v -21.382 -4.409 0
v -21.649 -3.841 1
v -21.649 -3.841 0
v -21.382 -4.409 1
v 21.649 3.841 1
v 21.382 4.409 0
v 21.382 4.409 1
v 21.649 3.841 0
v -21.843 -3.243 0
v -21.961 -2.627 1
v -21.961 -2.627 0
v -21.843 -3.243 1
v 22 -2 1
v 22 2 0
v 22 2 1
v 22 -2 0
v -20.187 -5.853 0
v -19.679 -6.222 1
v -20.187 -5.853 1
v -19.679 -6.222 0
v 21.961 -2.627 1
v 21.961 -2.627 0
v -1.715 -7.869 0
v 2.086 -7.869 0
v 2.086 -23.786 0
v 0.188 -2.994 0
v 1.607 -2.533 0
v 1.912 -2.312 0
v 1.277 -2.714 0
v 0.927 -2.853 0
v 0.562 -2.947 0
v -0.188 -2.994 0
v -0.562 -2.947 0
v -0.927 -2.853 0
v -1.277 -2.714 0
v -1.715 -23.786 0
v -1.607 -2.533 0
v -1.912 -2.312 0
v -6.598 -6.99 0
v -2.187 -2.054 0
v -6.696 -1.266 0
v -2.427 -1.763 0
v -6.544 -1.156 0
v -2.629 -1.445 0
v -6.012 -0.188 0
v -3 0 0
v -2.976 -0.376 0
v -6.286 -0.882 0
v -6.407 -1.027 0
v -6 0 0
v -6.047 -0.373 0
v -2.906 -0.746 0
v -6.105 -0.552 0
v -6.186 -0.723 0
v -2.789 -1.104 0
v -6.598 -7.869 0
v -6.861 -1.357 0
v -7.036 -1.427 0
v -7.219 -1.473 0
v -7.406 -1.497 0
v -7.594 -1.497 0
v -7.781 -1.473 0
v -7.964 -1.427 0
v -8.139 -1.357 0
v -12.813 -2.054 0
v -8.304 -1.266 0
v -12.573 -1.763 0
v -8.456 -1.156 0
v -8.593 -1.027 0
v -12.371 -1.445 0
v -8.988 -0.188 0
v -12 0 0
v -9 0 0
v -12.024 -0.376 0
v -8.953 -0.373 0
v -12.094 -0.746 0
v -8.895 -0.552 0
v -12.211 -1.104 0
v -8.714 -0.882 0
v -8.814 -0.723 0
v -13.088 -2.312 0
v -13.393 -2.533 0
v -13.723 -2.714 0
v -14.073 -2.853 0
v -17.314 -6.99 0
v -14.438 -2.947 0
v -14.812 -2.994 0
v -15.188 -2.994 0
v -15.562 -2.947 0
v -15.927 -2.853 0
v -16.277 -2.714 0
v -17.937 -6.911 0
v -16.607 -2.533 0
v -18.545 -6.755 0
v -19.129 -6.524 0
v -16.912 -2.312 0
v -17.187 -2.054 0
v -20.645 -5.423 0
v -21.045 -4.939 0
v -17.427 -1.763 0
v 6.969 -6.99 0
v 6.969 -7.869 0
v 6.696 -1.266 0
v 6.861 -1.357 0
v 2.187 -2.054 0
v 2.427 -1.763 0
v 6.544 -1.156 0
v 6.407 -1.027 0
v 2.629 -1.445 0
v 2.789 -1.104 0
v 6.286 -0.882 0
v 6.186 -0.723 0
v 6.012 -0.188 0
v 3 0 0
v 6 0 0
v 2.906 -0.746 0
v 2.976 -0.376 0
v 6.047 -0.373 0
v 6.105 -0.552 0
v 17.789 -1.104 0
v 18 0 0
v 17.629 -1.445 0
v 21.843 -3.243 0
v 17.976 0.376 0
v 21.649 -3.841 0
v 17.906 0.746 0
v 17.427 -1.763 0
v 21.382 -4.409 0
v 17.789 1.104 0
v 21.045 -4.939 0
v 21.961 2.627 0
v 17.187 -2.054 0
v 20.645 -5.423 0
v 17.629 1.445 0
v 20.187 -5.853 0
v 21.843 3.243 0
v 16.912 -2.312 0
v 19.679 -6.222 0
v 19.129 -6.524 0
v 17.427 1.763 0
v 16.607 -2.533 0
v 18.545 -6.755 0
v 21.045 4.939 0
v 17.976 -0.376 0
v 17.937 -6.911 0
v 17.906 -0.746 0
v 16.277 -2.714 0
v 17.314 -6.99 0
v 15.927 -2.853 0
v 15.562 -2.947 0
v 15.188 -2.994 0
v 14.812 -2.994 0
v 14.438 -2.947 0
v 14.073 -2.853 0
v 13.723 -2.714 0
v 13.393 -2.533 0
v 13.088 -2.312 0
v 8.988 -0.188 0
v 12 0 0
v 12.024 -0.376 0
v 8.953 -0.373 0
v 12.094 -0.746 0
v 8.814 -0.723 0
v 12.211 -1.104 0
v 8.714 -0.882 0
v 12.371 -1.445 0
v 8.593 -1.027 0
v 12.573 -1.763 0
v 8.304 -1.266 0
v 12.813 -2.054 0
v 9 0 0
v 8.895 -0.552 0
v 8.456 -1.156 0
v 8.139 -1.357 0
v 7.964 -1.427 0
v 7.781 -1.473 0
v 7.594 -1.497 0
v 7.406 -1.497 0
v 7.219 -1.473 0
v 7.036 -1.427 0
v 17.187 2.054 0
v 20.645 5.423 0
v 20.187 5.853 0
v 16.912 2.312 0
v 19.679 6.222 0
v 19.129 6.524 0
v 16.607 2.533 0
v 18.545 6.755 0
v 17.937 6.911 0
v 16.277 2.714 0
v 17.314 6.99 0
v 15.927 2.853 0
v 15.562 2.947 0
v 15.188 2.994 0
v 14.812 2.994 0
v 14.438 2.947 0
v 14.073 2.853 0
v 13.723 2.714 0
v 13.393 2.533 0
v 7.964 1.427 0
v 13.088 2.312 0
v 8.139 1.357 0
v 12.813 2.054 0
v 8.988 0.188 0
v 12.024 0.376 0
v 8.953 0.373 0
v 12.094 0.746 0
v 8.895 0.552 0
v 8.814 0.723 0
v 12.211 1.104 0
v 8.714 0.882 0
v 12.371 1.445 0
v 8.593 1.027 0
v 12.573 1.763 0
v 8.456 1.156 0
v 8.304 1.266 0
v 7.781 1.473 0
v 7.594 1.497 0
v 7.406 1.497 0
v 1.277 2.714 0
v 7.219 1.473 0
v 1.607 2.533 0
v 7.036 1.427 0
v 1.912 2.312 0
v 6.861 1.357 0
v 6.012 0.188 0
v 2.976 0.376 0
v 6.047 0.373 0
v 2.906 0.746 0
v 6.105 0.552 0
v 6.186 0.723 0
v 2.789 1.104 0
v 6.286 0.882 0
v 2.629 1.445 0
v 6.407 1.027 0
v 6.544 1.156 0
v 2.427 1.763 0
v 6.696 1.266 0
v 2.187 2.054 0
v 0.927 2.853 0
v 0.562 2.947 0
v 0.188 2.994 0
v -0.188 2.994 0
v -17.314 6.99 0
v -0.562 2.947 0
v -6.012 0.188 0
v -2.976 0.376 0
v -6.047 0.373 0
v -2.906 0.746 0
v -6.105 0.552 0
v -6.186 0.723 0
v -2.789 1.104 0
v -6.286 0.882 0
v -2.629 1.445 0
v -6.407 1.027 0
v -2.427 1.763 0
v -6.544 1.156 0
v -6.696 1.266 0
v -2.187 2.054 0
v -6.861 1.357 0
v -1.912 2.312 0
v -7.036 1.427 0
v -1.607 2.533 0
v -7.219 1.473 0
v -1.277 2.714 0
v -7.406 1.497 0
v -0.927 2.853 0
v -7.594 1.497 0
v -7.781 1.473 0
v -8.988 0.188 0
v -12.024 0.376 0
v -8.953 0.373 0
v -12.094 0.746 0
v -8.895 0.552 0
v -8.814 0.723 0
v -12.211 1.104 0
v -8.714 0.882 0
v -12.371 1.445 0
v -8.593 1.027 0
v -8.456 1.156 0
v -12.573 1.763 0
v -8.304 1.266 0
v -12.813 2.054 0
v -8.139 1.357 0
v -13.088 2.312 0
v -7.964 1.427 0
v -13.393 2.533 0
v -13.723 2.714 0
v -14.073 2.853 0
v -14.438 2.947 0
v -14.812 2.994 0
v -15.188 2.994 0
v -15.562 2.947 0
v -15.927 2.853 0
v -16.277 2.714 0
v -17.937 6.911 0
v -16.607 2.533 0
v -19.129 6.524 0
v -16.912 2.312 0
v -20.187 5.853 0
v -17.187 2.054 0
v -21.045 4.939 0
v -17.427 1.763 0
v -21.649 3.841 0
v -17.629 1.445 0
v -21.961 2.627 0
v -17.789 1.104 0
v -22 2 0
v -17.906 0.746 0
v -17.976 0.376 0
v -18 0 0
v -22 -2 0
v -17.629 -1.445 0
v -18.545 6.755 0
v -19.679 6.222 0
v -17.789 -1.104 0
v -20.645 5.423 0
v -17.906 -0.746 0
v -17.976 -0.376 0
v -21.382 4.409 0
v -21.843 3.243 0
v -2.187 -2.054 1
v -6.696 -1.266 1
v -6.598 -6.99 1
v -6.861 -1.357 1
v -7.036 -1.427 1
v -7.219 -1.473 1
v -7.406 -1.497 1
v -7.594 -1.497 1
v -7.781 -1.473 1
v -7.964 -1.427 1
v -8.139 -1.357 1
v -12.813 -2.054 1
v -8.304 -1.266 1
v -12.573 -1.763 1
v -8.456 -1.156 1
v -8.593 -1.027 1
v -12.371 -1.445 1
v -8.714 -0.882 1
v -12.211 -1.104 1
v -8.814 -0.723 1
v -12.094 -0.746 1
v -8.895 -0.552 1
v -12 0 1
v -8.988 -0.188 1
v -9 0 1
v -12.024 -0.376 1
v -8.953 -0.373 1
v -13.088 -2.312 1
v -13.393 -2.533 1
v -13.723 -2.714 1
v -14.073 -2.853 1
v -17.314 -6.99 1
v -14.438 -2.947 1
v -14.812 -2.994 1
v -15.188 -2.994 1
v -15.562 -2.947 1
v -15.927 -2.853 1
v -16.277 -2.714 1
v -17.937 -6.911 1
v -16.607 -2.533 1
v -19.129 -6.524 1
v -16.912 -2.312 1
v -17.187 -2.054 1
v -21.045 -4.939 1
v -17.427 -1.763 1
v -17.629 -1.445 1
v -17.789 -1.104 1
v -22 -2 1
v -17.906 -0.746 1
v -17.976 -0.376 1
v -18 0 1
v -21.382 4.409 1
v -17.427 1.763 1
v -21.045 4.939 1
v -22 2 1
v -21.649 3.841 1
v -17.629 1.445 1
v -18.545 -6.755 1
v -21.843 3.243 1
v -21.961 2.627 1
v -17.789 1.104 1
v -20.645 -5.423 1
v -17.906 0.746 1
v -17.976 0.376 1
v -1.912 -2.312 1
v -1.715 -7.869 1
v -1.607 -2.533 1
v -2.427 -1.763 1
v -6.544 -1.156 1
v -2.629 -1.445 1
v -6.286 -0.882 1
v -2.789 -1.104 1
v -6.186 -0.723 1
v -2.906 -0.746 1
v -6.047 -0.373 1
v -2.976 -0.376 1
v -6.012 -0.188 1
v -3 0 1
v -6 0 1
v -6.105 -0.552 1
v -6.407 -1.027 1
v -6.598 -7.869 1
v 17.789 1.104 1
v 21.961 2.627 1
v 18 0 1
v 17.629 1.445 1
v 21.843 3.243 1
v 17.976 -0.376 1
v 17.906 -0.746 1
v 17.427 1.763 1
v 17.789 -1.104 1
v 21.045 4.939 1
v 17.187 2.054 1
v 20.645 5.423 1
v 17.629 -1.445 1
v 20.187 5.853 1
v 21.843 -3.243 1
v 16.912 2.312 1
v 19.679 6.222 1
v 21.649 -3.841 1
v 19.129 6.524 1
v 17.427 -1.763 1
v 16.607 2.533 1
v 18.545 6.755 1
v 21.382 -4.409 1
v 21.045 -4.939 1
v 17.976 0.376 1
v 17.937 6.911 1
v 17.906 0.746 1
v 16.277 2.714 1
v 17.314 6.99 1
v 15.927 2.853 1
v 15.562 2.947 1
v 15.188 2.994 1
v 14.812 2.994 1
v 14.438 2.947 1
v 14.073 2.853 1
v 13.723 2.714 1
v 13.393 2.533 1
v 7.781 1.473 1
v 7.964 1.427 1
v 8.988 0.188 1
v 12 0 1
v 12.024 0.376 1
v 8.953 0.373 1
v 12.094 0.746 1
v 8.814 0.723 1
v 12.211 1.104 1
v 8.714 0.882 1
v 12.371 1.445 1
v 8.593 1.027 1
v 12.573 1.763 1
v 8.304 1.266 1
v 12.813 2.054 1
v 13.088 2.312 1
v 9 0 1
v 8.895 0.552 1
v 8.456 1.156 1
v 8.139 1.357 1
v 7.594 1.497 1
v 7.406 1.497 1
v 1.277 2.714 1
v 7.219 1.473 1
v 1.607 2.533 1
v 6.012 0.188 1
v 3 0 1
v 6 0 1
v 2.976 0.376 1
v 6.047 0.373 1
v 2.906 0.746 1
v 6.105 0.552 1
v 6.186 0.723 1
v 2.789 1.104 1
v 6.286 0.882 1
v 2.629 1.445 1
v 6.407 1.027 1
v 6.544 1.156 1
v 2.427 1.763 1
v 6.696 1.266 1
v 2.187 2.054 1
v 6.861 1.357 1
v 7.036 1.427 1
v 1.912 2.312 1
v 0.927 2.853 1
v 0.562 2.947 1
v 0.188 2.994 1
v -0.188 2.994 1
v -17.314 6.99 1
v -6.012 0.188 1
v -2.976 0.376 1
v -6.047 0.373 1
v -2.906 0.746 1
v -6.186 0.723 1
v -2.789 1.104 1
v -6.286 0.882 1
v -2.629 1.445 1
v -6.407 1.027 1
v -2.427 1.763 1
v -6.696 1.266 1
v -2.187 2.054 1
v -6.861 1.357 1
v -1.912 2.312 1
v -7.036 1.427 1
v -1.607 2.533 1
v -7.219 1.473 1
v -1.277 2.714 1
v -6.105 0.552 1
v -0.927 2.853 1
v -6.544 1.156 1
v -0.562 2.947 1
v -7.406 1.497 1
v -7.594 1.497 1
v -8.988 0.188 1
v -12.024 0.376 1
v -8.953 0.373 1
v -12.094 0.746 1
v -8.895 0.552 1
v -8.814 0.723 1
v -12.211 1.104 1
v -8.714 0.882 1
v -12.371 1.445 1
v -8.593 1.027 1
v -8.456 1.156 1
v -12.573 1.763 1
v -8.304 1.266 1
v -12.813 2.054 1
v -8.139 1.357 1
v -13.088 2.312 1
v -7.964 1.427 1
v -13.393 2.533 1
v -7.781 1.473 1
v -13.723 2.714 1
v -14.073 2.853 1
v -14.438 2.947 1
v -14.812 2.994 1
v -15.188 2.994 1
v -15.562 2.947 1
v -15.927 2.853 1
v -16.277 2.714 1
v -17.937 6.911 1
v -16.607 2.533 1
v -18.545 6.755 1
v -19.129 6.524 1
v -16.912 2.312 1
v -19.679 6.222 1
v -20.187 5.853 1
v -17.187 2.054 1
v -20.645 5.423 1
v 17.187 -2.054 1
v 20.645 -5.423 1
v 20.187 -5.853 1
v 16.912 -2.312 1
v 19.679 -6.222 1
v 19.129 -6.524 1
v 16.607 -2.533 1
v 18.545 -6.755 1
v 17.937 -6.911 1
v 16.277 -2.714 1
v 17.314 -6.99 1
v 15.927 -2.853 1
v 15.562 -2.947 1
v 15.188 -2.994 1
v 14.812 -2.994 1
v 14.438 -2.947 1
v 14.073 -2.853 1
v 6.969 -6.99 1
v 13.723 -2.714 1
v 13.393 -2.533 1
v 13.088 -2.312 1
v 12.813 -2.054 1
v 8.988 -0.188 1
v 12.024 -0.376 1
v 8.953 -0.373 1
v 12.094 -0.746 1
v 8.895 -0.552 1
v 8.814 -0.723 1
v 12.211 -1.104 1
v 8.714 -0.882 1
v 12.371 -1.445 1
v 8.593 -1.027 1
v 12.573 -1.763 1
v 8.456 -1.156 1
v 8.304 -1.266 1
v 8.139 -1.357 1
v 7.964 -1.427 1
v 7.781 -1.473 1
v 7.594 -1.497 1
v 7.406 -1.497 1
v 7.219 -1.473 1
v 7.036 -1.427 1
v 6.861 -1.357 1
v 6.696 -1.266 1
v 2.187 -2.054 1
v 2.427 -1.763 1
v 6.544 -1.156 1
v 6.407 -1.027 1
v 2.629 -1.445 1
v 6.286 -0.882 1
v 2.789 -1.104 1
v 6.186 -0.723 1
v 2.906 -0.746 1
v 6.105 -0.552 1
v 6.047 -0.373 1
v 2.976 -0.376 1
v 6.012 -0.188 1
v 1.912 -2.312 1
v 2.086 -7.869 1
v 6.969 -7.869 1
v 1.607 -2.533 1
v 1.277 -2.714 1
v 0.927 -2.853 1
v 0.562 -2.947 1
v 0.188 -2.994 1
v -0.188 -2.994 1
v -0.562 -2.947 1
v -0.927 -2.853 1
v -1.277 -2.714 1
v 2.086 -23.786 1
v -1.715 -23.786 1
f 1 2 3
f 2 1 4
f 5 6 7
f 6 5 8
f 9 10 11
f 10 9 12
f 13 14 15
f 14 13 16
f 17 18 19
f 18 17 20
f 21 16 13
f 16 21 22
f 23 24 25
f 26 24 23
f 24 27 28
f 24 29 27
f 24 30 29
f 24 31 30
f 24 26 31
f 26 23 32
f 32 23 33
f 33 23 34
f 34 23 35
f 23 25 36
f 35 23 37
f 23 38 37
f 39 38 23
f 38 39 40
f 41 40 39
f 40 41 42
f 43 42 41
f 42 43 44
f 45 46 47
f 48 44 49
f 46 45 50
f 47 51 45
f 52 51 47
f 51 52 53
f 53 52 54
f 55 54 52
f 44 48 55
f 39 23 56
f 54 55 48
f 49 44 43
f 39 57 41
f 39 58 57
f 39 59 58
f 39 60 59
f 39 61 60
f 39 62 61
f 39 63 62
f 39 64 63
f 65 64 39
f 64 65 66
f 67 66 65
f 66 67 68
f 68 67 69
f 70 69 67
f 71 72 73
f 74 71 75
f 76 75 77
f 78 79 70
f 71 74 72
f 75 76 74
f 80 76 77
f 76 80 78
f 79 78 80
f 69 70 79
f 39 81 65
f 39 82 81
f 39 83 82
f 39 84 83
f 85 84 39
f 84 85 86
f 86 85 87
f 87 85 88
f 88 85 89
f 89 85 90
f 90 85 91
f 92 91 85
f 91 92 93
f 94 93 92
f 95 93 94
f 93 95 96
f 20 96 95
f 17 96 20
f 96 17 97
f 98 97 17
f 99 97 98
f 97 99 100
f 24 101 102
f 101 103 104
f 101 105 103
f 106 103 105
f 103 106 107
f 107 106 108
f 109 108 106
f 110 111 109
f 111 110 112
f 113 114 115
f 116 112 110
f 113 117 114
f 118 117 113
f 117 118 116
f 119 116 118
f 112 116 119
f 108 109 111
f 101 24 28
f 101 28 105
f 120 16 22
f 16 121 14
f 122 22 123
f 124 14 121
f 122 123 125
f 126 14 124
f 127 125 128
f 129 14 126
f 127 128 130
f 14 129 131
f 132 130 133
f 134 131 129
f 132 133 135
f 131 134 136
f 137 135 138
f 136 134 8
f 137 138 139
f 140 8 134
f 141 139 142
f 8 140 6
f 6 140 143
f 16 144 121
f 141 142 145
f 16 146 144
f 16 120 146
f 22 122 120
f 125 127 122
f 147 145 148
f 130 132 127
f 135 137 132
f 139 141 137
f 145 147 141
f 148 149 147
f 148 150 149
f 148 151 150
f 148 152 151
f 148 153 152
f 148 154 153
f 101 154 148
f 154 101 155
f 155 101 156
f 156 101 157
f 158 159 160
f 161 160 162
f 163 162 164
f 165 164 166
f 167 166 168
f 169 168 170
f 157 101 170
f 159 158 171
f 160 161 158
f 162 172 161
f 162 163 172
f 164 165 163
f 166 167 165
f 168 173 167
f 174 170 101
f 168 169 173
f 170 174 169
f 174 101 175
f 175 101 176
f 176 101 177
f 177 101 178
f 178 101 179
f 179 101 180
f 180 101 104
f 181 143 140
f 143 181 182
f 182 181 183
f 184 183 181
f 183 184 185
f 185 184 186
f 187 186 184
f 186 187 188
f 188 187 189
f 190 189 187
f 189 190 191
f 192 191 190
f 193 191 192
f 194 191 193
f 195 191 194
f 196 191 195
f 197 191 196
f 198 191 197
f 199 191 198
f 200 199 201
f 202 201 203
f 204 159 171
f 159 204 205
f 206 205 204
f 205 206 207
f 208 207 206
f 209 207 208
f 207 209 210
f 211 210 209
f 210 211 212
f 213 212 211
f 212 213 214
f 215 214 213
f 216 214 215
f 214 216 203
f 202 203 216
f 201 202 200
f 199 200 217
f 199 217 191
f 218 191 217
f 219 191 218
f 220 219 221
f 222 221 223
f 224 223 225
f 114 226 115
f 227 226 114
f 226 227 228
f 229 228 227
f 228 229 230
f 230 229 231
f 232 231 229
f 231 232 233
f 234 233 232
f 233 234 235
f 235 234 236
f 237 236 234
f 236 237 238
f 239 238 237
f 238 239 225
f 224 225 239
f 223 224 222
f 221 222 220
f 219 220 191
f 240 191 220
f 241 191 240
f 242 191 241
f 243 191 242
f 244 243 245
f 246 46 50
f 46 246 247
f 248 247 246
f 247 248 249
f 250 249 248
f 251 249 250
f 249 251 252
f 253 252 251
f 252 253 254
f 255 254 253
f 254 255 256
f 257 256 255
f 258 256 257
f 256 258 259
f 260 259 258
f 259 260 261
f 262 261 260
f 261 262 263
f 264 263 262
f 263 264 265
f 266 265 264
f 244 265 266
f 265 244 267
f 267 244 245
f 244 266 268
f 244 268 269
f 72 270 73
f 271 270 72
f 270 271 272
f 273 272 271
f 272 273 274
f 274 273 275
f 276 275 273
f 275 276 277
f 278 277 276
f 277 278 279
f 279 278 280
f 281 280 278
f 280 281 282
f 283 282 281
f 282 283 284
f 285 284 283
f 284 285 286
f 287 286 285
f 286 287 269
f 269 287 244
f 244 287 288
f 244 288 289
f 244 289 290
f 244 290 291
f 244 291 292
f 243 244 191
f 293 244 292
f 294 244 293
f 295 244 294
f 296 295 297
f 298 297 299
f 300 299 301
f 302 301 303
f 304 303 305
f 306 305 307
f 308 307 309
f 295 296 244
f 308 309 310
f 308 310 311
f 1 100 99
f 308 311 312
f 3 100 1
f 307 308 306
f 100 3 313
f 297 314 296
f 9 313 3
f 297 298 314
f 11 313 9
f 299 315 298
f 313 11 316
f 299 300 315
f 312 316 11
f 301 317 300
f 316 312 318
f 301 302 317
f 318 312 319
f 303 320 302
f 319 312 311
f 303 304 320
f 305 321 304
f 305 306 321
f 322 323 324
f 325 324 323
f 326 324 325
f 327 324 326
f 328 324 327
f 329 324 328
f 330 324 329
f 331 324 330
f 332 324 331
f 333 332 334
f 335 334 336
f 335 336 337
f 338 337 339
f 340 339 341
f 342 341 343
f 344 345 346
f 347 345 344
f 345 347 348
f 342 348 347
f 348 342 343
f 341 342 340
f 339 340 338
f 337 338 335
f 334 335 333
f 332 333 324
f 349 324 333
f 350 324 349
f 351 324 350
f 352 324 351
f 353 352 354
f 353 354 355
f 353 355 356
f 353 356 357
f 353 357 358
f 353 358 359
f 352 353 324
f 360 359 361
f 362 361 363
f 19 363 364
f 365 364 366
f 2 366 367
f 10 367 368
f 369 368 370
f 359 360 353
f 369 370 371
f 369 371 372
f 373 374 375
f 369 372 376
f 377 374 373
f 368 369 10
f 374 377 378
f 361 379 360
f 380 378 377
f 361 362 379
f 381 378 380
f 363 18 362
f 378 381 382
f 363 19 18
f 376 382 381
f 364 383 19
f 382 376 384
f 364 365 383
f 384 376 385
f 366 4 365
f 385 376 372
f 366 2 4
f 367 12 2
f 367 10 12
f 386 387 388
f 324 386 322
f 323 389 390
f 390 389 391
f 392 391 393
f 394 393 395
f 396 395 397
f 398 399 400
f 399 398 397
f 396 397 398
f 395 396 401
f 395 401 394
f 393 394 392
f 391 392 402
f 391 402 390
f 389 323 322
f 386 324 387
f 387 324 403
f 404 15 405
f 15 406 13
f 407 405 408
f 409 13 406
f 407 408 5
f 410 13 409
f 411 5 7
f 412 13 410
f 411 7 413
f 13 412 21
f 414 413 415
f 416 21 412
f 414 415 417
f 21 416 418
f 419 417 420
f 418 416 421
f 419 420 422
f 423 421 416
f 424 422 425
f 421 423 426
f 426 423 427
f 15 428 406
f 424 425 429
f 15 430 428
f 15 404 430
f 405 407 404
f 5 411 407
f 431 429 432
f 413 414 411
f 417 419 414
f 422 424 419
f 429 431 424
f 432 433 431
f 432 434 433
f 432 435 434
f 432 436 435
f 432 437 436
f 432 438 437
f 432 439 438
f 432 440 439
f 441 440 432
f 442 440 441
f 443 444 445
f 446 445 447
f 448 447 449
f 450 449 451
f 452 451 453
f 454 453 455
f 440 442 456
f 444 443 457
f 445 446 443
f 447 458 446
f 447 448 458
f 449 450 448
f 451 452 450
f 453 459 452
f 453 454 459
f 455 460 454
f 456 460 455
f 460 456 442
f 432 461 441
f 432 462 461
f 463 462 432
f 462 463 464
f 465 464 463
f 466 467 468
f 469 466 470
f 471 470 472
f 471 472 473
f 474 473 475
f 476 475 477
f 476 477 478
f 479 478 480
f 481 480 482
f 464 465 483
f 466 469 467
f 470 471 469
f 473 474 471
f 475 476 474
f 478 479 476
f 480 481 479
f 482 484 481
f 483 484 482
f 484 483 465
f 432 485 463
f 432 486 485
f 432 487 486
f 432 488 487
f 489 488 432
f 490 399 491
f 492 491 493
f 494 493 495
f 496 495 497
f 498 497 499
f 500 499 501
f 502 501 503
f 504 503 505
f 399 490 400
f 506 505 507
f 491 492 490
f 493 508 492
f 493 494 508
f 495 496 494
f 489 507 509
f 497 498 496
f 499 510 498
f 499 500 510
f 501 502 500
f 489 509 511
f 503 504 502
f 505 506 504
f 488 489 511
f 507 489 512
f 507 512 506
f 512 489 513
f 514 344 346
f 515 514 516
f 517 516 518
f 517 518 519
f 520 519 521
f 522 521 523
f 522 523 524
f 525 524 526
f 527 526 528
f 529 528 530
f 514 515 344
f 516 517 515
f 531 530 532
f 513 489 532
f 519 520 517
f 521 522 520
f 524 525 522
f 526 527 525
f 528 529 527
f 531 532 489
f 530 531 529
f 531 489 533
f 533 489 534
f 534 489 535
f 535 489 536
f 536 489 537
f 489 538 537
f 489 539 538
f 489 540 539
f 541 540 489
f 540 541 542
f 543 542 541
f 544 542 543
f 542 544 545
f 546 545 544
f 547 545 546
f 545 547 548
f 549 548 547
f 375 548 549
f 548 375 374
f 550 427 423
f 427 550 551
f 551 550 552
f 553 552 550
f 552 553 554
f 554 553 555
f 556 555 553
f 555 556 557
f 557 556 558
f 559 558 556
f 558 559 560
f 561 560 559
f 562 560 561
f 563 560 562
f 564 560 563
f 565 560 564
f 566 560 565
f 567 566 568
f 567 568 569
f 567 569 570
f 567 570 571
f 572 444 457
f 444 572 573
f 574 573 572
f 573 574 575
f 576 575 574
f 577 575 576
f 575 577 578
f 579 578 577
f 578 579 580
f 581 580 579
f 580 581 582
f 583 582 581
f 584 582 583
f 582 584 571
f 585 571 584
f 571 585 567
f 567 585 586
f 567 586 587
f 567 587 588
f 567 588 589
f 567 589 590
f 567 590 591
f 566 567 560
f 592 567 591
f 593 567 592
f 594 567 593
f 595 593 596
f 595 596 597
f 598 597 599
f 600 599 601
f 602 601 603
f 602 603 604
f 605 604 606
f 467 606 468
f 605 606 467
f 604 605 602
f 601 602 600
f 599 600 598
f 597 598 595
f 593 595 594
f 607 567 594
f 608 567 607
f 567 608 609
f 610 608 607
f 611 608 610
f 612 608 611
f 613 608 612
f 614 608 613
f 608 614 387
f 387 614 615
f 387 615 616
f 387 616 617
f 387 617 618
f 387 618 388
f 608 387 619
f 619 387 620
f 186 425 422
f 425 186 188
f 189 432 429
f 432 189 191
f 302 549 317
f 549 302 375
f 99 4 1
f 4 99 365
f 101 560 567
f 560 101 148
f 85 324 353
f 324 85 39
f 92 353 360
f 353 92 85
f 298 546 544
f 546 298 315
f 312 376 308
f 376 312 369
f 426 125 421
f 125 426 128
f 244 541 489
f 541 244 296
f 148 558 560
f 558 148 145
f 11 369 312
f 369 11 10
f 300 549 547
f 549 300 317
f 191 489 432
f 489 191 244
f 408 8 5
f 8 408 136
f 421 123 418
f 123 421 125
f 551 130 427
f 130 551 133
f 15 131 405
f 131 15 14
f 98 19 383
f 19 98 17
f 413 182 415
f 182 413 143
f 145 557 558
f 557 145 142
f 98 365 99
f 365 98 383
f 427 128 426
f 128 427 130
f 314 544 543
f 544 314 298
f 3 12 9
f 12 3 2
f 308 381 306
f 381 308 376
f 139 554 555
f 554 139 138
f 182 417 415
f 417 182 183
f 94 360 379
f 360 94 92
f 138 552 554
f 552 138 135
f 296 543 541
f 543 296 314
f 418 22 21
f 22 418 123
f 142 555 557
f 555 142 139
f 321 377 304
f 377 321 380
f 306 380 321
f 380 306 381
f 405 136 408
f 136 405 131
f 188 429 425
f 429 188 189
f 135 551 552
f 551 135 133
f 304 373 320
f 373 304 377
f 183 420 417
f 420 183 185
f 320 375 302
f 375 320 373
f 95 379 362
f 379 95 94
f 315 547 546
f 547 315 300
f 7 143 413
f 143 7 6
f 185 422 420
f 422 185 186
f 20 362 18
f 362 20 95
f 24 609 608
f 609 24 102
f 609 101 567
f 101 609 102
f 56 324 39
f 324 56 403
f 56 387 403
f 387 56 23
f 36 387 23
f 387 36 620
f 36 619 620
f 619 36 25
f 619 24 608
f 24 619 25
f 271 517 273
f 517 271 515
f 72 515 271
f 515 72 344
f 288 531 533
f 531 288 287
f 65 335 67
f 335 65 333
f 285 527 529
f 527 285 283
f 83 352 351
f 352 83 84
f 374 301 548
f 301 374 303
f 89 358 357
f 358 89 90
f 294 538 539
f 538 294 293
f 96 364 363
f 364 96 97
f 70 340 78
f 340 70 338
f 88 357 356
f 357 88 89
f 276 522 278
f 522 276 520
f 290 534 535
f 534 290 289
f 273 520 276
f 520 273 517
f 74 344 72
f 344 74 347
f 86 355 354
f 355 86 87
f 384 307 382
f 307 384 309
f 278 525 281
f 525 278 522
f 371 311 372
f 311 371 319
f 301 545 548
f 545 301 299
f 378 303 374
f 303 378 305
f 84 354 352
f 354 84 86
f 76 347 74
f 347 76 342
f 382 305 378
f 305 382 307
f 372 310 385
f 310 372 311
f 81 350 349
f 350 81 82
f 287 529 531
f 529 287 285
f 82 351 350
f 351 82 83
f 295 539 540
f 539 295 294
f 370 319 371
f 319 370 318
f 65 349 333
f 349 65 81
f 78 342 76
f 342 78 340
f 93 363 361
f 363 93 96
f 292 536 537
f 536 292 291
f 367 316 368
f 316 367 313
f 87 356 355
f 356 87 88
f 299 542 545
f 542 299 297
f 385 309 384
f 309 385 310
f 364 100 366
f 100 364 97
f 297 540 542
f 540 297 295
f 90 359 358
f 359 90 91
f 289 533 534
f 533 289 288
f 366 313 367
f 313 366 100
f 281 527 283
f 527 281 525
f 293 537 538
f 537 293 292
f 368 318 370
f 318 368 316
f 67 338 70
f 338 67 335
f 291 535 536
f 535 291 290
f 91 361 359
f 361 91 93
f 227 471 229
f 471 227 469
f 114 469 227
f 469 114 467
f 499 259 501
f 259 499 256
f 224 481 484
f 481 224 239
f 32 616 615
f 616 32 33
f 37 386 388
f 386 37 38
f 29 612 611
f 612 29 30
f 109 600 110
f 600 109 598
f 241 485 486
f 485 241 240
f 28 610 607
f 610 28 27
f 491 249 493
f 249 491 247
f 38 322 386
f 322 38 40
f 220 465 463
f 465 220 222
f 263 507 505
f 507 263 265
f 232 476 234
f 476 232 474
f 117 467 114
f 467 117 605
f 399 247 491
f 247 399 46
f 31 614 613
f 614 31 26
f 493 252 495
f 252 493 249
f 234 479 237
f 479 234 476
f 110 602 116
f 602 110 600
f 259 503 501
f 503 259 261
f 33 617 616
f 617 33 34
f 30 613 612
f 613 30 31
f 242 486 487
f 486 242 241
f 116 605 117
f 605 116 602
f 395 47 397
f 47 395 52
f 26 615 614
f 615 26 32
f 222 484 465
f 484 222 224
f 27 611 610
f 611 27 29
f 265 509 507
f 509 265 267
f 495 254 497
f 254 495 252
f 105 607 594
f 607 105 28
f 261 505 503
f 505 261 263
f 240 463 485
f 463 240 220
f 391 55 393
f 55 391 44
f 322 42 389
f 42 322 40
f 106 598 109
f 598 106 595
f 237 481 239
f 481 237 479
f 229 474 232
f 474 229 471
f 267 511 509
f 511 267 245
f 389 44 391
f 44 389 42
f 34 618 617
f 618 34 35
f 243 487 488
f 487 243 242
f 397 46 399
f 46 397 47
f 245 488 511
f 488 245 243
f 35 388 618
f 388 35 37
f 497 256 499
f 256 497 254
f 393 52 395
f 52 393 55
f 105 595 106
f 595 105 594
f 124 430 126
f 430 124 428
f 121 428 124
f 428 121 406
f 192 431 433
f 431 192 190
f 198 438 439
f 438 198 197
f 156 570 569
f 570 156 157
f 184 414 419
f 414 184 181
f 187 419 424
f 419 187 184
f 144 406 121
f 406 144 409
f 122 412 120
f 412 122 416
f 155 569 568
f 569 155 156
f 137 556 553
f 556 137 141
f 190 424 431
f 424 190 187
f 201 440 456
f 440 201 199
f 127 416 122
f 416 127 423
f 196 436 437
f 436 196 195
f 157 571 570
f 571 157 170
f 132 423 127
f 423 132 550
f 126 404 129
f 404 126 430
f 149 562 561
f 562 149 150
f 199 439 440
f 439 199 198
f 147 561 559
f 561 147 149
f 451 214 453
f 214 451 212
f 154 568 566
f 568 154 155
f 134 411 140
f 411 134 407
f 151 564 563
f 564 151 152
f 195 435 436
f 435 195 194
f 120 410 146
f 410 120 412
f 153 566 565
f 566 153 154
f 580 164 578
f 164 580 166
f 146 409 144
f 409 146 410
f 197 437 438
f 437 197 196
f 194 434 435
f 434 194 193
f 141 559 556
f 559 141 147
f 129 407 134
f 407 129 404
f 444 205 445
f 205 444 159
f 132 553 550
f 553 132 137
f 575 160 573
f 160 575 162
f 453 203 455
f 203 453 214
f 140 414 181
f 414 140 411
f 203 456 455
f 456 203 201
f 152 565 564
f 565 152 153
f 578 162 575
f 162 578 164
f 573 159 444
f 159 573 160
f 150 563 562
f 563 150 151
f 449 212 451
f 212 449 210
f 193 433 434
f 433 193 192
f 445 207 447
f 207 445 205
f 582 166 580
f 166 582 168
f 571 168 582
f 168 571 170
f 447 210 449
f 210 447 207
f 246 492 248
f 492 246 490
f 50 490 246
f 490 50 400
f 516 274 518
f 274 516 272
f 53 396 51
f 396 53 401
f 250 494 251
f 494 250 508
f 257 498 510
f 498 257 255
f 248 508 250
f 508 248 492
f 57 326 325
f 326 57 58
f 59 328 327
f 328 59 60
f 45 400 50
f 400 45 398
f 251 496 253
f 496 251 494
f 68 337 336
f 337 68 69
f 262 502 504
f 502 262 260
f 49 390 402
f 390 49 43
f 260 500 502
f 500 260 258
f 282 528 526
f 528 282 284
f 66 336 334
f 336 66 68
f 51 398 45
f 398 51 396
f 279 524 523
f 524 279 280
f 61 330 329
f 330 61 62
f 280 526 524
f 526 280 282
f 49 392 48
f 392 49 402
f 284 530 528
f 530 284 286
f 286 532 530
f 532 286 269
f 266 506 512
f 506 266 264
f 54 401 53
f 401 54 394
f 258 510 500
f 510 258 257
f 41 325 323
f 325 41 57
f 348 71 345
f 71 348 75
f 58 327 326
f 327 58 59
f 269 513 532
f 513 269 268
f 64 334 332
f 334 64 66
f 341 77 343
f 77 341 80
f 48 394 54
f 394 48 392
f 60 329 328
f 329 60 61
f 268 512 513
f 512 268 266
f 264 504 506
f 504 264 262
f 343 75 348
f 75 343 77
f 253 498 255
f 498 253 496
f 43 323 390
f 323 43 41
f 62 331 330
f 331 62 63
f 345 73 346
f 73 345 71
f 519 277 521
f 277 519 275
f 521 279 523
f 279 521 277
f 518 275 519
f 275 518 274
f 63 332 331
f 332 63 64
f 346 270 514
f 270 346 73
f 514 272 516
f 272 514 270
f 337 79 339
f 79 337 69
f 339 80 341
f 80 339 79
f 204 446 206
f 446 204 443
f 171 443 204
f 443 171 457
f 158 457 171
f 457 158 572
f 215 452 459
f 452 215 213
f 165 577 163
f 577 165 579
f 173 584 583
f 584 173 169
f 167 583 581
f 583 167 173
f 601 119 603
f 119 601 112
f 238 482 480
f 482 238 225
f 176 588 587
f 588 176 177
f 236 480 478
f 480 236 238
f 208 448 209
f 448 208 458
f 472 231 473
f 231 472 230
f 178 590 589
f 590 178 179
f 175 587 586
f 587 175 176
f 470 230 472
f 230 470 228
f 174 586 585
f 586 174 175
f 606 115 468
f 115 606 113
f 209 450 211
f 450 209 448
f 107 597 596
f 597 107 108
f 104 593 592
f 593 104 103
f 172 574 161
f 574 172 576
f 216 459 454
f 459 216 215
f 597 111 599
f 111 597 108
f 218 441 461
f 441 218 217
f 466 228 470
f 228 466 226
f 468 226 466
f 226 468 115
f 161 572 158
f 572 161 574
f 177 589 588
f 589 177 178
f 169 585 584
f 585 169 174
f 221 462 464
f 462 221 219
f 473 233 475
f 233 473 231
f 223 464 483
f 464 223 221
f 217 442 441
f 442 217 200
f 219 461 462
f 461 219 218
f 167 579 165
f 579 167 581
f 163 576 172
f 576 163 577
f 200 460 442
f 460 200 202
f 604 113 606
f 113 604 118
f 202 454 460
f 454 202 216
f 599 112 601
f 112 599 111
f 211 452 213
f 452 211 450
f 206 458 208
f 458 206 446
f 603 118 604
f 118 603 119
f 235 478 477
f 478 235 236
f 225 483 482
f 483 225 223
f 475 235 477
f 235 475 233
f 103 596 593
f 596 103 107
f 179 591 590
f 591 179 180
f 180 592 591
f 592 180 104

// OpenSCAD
$fn = 50;


difference() {
	union() {
		hull() {
			translate(v = [-17.0000000000, 2.0000000000, 0]) {
				cylinder(h = 1, r = 5);
			}
			translate(v = [17.0000000000, 2.0000000000, 0]) {
				cylinder(h = 1, r = 5);
			}
			translate(v = [-17.0000000000, -2.0000000000, 0]) {
				cylinder(h = 1, r = 5);
			}
			translate(v = [17.0000000000, -2.0000000000, 0]) {
				cylinder(h = 1, r = 5);
			}
		}
		translate(v = [0, -5, 0]) {
			linear_extrude(height = 1) {
				text(font = "DejaVu Sans Mono:style=Bold", halign = "center", size = 19.0000000000, text = "T", valign = "top");
			}
		}
	}
	union() {
		translate(v = [-15.0000000000, 0.0000000000, 0]) {
			translate(v = [0, 0, -100]) {
				cylinder(h = 200, r = 3.0000000000);
			}
		}
		translate(v = [0, 0, -100]) {
			cylinder(h = 200, r = 3.0000000000);
		}
		translate(v = [15.0000000000, 0.0000000000, 0]) {
			translate(v = [0, 0, -100]) {
				cylinder(h = 200, r = 3.0000000000);
			}
		}
		translate(v = [-15.0000000000, 0.0000000000, 0]) {
			translate(v = [0, 0, -100]) {
				cylinder(h = 200, r = 1.5000000000);
			}
		}
		translate(v = [-7.5000000000, 0.0000000000, 0]) {
			translate(v = [0, 0, -100]) {
				cylinder(h = 200, r = 1.5000000000);
			}
		}
		translate(v = [0, 0, -100]) {
			cylinder(h = 200, r = 1.5000000000);
		}
		translate(v = [7.5000000000, 0.0000000000, 0]) {
			translate(v = [0, 0, -100]) {
				cylinder(h = 200, r = 1.5000000000);
			}
		}
		translate(v = [15.0000000000, 0.0000000000, 0]) {
			translate(v = [0, 0, -100]) {
				cylinder(h = 200, r = 1.5000000000);
			}
		}
	}
}
